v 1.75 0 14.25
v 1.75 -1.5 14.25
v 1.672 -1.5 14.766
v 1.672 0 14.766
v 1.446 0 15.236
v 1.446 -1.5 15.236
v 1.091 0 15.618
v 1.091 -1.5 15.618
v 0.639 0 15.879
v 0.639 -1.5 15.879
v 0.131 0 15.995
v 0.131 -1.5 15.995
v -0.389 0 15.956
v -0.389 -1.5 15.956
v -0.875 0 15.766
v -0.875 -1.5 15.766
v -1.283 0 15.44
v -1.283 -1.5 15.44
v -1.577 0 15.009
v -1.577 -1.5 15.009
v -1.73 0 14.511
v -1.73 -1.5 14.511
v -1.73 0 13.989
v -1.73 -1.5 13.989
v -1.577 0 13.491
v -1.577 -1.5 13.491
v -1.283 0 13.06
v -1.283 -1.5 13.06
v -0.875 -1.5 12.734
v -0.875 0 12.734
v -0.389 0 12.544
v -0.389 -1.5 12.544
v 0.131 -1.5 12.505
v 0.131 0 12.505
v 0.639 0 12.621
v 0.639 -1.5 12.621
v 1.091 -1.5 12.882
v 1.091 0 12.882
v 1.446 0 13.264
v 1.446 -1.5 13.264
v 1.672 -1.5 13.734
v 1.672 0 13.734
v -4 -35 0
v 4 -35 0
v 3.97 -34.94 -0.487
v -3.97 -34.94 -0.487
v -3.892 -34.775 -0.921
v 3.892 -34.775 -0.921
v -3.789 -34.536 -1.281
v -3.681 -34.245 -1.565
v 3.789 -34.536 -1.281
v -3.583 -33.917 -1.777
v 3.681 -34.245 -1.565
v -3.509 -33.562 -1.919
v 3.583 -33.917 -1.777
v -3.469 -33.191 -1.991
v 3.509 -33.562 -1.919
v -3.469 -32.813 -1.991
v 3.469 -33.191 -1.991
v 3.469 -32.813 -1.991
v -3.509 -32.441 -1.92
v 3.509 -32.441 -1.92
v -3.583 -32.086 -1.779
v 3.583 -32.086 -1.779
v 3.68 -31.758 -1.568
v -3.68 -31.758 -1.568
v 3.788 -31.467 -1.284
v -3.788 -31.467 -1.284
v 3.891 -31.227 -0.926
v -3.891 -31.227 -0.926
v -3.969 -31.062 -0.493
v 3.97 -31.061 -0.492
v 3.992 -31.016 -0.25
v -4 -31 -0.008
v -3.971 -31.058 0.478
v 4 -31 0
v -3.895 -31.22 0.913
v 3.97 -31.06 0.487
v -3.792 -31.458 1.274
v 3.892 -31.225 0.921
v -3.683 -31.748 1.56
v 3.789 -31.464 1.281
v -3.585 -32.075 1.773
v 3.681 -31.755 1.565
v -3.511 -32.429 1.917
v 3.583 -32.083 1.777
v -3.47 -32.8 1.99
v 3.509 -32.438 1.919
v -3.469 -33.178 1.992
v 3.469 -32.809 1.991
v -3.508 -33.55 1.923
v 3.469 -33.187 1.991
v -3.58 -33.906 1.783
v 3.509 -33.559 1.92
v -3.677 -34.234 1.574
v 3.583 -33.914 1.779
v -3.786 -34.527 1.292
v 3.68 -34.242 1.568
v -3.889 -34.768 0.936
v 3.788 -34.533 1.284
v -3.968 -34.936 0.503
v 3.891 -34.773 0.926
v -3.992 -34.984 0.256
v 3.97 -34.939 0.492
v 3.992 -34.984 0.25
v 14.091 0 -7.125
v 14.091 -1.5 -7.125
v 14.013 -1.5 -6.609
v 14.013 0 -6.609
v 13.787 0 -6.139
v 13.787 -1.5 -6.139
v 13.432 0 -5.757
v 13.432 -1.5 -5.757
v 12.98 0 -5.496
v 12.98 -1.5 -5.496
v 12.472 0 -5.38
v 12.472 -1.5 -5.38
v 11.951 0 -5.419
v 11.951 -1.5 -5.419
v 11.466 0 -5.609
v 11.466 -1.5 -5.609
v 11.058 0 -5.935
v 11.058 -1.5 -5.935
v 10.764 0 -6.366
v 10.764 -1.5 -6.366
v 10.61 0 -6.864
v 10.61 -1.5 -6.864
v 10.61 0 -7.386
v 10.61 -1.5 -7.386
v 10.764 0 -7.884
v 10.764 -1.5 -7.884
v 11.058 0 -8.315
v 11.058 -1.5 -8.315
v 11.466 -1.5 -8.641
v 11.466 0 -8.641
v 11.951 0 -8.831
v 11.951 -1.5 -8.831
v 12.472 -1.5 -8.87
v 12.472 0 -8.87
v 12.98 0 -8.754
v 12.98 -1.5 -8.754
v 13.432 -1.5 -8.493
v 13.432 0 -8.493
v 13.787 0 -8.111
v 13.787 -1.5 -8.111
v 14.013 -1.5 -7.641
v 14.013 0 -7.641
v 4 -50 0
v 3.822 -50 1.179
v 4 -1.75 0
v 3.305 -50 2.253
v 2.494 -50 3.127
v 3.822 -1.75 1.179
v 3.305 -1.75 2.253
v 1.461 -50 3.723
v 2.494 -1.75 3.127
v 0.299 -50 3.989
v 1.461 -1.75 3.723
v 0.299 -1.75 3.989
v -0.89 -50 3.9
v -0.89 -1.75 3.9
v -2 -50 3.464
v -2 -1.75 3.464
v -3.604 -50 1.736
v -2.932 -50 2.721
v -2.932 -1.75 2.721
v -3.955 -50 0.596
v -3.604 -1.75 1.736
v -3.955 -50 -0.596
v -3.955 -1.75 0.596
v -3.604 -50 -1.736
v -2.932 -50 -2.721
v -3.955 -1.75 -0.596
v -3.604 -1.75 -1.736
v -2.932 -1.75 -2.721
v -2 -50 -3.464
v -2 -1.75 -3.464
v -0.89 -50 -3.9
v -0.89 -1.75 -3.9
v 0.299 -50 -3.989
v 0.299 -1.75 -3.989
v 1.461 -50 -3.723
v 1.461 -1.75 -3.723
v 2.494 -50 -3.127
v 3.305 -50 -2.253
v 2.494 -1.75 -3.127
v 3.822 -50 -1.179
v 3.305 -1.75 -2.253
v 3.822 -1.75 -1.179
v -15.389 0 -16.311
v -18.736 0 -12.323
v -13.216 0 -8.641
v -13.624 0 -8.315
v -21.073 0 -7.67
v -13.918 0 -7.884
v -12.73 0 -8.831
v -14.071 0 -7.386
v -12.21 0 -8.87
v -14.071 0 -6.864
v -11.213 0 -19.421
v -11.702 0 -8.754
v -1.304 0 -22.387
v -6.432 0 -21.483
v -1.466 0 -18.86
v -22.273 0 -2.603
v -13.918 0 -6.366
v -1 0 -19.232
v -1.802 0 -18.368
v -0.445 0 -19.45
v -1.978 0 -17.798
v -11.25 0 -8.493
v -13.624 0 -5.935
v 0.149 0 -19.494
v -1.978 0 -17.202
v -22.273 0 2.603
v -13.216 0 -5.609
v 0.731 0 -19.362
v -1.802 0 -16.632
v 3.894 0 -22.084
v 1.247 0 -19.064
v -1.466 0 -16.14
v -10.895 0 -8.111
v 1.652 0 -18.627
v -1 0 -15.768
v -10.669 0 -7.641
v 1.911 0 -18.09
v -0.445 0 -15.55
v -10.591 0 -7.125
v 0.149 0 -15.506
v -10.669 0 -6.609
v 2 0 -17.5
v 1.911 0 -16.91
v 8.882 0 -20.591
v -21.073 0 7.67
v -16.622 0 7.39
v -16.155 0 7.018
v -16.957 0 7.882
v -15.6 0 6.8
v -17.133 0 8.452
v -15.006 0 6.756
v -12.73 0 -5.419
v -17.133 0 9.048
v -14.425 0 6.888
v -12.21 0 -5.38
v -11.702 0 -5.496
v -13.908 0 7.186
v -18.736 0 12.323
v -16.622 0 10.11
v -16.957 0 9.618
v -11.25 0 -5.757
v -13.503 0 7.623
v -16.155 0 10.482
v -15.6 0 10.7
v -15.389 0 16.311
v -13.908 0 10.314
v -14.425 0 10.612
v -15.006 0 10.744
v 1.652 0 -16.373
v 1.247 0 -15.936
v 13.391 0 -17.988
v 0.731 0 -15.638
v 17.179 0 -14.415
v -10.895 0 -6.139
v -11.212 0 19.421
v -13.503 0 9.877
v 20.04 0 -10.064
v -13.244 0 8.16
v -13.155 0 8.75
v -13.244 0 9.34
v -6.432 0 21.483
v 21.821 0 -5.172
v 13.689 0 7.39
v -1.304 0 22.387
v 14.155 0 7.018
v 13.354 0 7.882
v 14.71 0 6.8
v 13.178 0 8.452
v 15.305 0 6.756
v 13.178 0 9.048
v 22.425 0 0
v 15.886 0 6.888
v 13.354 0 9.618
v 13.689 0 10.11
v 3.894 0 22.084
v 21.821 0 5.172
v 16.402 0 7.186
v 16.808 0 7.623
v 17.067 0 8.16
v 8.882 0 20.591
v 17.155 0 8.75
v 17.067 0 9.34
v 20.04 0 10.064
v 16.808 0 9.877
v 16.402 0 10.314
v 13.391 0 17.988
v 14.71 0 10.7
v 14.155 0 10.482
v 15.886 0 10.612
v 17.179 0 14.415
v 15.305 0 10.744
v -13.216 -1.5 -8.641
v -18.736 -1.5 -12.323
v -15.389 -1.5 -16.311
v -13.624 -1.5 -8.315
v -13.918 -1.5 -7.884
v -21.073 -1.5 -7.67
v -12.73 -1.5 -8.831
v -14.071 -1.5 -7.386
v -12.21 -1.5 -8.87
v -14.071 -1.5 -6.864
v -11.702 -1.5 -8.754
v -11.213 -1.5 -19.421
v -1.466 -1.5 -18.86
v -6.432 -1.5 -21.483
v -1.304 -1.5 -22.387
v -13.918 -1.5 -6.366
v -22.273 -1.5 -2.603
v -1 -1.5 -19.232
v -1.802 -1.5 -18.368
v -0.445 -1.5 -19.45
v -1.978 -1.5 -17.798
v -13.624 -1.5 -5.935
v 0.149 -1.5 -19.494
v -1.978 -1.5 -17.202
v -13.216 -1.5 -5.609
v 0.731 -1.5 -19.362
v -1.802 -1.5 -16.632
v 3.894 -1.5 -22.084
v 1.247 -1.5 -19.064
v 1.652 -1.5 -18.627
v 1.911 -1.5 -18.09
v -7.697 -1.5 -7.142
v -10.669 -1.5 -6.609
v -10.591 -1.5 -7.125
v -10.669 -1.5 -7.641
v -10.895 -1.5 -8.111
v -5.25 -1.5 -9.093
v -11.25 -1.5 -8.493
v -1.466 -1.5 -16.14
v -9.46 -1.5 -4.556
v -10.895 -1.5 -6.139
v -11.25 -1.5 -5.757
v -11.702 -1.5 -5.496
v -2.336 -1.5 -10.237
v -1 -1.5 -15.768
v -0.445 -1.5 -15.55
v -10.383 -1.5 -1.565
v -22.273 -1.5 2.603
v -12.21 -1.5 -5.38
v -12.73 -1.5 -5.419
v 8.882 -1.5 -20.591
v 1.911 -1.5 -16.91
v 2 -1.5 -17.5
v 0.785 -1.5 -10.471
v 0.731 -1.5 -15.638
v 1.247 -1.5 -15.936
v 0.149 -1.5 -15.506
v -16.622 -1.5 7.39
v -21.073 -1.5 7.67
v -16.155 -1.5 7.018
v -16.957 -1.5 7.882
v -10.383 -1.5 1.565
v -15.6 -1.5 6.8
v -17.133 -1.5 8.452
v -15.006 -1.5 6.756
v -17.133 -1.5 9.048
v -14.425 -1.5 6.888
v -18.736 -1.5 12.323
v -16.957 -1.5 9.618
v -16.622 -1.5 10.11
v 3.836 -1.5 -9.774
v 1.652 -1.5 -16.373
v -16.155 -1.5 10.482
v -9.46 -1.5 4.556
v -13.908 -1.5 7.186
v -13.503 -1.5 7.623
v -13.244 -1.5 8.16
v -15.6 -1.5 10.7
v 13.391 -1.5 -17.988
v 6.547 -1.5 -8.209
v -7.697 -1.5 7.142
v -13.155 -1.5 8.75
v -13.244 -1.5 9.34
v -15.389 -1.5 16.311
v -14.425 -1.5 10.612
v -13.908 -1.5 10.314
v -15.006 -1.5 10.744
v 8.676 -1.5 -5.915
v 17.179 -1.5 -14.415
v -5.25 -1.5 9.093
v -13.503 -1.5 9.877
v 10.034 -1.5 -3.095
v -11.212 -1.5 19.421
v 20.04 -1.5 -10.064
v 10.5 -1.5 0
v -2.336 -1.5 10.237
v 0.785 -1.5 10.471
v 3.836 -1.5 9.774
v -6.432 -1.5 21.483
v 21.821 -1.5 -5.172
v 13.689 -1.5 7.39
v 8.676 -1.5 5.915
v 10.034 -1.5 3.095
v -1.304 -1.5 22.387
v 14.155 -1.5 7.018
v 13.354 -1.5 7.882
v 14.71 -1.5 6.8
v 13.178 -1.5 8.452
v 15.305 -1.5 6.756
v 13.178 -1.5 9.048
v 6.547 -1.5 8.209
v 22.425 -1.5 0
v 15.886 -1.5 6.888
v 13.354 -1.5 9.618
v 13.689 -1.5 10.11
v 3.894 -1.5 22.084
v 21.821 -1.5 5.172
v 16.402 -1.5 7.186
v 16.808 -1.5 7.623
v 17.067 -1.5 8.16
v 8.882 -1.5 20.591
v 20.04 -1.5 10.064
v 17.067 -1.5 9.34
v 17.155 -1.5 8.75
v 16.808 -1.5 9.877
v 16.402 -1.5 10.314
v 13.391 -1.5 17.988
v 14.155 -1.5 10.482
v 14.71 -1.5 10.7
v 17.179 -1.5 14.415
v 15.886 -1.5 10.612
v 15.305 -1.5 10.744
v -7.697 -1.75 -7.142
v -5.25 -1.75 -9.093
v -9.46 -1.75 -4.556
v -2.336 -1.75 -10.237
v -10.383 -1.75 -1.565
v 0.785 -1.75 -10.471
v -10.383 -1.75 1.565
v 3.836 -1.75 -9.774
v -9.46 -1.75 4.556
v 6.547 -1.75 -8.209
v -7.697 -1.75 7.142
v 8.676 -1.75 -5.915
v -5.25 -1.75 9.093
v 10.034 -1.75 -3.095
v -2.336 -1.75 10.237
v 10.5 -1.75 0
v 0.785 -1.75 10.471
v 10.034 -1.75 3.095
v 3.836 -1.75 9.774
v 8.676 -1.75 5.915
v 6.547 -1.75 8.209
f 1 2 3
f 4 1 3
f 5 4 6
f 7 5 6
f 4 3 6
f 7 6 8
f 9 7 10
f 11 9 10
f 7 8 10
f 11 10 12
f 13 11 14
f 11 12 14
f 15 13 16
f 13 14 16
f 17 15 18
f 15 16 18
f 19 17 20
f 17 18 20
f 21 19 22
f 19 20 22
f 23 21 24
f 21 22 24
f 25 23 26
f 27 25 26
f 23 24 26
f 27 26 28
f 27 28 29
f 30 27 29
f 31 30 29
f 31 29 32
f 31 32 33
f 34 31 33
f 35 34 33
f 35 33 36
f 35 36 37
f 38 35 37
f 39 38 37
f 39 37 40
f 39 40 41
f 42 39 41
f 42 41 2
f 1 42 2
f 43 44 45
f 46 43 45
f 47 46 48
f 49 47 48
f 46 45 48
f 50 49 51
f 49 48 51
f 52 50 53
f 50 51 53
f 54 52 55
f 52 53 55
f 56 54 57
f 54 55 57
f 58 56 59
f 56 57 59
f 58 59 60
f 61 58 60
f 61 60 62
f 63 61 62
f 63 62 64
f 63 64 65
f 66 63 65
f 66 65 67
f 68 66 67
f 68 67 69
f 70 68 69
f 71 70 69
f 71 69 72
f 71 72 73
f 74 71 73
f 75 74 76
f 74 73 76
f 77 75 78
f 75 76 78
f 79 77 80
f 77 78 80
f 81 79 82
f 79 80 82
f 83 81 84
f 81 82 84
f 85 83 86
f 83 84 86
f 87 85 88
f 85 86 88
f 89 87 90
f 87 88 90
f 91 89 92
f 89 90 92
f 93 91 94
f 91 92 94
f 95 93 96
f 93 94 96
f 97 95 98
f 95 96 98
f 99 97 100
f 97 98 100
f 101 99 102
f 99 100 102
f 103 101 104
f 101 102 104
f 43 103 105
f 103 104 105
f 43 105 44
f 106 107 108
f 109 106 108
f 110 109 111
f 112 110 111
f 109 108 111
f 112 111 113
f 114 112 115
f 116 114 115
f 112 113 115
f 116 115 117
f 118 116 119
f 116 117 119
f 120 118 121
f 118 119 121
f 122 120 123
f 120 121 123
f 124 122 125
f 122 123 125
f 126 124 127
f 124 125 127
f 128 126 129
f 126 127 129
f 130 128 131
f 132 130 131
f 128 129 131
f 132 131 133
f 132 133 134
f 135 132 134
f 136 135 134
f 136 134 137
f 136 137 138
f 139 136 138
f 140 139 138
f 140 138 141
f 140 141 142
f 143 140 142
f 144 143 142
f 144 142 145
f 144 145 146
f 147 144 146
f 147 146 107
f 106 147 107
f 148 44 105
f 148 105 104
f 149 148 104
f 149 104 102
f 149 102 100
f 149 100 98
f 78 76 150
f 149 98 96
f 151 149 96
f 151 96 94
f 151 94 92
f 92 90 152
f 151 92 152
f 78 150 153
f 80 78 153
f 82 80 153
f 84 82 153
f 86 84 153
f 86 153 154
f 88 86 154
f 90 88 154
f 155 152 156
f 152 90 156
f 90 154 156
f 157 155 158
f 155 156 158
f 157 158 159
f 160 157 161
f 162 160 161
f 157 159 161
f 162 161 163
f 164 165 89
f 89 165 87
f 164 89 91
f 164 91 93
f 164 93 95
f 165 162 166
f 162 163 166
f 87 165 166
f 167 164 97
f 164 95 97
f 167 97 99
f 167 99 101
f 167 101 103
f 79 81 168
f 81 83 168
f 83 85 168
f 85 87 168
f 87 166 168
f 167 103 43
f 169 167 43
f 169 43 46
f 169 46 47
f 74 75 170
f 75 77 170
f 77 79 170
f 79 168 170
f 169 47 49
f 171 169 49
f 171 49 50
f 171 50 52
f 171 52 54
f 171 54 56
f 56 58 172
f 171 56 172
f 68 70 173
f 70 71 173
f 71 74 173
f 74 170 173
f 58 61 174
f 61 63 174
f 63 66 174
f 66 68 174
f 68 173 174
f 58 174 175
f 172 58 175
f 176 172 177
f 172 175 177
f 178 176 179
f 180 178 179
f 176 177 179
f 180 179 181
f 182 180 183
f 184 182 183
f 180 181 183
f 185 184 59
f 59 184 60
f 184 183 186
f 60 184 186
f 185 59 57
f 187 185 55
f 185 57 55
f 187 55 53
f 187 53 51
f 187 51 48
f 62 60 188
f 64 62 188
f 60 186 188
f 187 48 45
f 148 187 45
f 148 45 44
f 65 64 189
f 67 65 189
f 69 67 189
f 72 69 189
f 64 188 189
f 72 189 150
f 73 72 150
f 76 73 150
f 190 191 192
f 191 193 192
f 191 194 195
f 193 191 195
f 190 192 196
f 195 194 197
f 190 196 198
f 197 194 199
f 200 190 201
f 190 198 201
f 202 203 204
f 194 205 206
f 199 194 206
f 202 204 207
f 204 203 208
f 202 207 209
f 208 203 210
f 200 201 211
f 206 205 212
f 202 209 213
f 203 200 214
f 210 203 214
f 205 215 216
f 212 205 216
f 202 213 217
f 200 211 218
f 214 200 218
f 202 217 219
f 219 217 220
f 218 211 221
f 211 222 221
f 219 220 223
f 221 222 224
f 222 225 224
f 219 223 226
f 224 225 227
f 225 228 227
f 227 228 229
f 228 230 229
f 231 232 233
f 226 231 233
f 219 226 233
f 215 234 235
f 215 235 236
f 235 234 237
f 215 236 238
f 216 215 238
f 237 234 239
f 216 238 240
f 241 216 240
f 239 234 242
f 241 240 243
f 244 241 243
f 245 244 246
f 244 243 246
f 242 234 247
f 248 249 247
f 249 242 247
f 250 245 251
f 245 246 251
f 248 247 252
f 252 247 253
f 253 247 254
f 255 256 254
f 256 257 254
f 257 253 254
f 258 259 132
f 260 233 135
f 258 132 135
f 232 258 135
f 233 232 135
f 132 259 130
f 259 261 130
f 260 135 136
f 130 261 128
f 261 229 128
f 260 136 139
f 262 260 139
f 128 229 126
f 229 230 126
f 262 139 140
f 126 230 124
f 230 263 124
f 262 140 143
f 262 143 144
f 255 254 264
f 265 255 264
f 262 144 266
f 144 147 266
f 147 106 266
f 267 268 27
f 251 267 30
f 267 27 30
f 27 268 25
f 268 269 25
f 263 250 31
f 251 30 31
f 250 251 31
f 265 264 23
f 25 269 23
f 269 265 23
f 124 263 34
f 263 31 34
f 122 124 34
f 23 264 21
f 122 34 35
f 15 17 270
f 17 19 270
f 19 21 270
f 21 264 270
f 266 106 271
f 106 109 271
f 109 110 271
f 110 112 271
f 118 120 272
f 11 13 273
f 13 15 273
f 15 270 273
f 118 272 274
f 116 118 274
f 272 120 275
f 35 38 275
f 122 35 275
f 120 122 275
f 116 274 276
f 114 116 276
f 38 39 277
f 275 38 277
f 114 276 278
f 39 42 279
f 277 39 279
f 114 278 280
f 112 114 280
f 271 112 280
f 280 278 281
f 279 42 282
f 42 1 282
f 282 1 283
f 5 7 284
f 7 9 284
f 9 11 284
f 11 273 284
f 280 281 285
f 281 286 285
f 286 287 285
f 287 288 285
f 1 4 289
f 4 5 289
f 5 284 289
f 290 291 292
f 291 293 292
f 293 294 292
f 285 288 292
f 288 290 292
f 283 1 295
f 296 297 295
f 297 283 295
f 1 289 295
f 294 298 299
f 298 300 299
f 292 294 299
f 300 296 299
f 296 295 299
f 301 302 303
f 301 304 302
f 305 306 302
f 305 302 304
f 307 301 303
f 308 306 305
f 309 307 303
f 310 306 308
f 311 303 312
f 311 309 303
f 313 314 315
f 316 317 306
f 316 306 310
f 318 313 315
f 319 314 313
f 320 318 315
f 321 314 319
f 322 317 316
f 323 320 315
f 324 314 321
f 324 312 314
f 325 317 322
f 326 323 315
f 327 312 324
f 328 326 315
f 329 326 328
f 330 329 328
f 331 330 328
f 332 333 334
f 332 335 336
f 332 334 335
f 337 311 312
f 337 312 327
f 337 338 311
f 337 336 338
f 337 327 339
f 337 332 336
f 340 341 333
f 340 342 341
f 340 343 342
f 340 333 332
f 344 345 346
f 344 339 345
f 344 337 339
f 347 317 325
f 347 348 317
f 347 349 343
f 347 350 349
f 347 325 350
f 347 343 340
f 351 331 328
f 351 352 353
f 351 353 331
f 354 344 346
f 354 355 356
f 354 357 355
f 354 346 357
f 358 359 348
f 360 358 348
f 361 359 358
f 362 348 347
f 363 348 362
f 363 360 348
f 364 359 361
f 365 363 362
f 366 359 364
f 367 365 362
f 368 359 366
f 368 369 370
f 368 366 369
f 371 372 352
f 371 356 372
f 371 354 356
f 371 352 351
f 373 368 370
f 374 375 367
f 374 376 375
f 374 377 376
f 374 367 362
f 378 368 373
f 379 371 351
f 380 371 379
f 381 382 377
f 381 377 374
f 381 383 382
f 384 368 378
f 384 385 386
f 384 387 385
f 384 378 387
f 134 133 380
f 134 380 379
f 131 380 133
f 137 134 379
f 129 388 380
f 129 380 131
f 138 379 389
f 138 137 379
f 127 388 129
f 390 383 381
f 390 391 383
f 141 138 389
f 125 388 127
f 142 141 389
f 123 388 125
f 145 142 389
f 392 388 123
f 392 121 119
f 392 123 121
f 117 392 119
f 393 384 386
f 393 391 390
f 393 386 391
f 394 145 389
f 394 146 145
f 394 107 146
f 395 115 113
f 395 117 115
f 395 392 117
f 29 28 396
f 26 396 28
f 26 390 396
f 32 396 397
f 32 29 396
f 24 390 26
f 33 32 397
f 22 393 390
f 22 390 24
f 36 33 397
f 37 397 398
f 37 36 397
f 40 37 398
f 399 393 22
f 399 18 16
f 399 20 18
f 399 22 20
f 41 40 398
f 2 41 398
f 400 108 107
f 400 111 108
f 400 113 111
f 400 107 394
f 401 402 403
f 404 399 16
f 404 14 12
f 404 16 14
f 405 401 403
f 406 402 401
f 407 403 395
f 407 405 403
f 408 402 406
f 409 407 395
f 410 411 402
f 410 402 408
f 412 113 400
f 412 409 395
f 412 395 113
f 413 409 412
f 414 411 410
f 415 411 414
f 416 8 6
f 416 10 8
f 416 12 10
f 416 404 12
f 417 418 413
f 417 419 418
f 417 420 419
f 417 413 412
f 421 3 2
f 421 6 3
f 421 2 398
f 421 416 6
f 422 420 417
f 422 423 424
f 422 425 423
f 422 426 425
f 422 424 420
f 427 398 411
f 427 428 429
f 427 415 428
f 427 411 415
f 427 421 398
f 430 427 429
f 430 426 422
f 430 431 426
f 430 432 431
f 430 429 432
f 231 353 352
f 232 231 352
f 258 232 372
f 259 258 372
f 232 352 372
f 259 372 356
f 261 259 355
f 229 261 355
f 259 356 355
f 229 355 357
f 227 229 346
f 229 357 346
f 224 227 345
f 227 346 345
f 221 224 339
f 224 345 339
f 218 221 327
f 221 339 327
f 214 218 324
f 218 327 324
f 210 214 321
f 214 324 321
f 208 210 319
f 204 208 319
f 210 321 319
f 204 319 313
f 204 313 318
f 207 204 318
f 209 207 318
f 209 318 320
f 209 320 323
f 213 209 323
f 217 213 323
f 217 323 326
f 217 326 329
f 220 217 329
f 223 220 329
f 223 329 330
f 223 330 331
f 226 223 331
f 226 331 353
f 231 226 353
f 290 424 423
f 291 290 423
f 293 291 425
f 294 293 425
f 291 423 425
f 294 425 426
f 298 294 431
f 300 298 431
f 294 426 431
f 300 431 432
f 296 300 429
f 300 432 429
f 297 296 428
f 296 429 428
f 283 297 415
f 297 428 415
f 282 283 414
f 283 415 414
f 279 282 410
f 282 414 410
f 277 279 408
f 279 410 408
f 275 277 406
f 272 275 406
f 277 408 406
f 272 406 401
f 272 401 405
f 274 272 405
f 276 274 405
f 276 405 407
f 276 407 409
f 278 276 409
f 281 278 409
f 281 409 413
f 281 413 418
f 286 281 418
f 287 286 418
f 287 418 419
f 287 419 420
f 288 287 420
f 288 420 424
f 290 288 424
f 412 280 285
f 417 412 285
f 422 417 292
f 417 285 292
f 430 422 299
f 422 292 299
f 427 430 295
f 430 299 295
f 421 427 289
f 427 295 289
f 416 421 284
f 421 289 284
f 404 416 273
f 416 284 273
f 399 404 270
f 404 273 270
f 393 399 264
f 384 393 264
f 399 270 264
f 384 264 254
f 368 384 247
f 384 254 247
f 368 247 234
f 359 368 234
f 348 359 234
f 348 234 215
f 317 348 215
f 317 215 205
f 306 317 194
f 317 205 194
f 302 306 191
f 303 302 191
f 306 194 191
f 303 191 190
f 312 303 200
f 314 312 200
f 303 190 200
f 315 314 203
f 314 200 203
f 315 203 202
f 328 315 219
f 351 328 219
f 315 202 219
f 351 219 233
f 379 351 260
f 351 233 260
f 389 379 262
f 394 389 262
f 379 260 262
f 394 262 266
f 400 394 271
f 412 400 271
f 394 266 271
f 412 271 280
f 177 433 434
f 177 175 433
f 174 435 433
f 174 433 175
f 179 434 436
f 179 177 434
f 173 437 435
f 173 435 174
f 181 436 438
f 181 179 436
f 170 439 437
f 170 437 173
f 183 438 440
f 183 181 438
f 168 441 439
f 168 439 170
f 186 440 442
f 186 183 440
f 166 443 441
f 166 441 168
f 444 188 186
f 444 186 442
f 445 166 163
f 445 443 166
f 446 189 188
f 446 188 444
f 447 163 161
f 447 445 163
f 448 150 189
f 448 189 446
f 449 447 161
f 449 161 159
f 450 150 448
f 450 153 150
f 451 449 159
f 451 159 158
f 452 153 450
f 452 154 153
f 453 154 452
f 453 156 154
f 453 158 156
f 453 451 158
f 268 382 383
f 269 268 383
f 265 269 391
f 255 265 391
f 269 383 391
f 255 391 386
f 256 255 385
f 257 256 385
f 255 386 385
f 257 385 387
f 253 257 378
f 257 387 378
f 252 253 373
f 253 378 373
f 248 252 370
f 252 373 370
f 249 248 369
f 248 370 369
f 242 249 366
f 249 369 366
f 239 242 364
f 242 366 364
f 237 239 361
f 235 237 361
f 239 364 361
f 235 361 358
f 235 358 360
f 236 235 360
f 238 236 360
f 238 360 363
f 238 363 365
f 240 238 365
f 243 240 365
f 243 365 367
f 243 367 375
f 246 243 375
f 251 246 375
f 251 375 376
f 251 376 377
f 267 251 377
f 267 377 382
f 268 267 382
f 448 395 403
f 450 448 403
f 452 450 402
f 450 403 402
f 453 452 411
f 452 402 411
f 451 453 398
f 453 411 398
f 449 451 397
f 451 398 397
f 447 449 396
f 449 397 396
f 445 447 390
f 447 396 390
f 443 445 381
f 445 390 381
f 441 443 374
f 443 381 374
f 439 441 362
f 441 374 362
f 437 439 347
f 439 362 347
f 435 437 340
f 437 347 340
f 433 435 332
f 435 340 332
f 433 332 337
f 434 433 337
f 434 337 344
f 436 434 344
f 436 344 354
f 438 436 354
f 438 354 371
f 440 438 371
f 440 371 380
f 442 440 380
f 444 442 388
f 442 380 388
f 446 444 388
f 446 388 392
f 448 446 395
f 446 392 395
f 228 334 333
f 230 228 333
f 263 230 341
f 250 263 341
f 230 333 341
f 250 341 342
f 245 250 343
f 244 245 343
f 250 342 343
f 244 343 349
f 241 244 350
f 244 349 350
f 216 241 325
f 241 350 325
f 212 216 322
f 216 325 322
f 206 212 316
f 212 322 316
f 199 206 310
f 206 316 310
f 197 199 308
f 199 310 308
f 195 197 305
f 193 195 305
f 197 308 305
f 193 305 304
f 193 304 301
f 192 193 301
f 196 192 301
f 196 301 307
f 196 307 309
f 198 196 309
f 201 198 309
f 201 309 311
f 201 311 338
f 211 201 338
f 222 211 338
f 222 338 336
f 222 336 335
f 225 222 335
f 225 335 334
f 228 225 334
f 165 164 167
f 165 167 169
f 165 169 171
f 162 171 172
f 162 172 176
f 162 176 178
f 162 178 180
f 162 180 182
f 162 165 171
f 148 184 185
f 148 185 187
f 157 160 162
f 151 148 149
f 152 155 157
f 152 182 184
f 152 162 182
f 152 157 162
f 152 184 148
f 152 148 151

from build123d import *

# Parameters (mm, degrees)
F0_R     = 22.425
F1_DEPTH = 1.5
F2_R     = 10.5
F3_DEPTH = 0.25
F4_R     = 4
F5_DEPTH = 48.25
F7_D     = 4
F9_D     = 4
F11_D    = 3.5
F13_D    = 4


with BuildPart() as f1:
    # F0 (on Front) → F1 (new body)
    with BuildSketch(Plane.XZ):
        Circle(F0_R)
    extrude(amount=F1_DEPTH)

    # F2 (on face) → F3 (join)
    with BuildSketch(Plane.XZ.offset(1.5)):
        Circle(F2_R)
    extrude(amount=F3_DEPTH)

    # F4 (on face) → F5 (join)
    with BuildSketch(Plane.XZ.offset(1.75)):
        Circle(F4_R)
    extrude(amount=F5_DEPTH)

    # F7 (through all)
    with Locations(Plane(origin=(0, 0, 0), x_dir=(0, 1, 0), z_dir=(-1, 0, 0))):
        with Locations((-33, 0)):
            Hole(F7_D / 2)

    # F9 (through all)
    with Locations(Plane.YZ):
        with Locations((-33, 0)):
            Hole(F9_D / 2)

    # F11 (through all)
    with Locations(Plane(origin=(0, 0, 0), x_dir=(-1, 0, 0), z_dir=(0, 1, 0))):
        with Locations((0, 14.25), (-12.340862, -7.125), (12.340862, -7.125)):
            Hole(F11_D / 2)

    # F13 (through all)
    with Locations(Plane(origin=(0, 0, 0), x_dir=(-1, 0, 0), z_dir=(0, 1, 0))):
        with Locations((-15.155445, 8.75), (0, -17.5), (15.155445, 8.75)):
            Hole(F13_D / 2)


solid = f1.part
